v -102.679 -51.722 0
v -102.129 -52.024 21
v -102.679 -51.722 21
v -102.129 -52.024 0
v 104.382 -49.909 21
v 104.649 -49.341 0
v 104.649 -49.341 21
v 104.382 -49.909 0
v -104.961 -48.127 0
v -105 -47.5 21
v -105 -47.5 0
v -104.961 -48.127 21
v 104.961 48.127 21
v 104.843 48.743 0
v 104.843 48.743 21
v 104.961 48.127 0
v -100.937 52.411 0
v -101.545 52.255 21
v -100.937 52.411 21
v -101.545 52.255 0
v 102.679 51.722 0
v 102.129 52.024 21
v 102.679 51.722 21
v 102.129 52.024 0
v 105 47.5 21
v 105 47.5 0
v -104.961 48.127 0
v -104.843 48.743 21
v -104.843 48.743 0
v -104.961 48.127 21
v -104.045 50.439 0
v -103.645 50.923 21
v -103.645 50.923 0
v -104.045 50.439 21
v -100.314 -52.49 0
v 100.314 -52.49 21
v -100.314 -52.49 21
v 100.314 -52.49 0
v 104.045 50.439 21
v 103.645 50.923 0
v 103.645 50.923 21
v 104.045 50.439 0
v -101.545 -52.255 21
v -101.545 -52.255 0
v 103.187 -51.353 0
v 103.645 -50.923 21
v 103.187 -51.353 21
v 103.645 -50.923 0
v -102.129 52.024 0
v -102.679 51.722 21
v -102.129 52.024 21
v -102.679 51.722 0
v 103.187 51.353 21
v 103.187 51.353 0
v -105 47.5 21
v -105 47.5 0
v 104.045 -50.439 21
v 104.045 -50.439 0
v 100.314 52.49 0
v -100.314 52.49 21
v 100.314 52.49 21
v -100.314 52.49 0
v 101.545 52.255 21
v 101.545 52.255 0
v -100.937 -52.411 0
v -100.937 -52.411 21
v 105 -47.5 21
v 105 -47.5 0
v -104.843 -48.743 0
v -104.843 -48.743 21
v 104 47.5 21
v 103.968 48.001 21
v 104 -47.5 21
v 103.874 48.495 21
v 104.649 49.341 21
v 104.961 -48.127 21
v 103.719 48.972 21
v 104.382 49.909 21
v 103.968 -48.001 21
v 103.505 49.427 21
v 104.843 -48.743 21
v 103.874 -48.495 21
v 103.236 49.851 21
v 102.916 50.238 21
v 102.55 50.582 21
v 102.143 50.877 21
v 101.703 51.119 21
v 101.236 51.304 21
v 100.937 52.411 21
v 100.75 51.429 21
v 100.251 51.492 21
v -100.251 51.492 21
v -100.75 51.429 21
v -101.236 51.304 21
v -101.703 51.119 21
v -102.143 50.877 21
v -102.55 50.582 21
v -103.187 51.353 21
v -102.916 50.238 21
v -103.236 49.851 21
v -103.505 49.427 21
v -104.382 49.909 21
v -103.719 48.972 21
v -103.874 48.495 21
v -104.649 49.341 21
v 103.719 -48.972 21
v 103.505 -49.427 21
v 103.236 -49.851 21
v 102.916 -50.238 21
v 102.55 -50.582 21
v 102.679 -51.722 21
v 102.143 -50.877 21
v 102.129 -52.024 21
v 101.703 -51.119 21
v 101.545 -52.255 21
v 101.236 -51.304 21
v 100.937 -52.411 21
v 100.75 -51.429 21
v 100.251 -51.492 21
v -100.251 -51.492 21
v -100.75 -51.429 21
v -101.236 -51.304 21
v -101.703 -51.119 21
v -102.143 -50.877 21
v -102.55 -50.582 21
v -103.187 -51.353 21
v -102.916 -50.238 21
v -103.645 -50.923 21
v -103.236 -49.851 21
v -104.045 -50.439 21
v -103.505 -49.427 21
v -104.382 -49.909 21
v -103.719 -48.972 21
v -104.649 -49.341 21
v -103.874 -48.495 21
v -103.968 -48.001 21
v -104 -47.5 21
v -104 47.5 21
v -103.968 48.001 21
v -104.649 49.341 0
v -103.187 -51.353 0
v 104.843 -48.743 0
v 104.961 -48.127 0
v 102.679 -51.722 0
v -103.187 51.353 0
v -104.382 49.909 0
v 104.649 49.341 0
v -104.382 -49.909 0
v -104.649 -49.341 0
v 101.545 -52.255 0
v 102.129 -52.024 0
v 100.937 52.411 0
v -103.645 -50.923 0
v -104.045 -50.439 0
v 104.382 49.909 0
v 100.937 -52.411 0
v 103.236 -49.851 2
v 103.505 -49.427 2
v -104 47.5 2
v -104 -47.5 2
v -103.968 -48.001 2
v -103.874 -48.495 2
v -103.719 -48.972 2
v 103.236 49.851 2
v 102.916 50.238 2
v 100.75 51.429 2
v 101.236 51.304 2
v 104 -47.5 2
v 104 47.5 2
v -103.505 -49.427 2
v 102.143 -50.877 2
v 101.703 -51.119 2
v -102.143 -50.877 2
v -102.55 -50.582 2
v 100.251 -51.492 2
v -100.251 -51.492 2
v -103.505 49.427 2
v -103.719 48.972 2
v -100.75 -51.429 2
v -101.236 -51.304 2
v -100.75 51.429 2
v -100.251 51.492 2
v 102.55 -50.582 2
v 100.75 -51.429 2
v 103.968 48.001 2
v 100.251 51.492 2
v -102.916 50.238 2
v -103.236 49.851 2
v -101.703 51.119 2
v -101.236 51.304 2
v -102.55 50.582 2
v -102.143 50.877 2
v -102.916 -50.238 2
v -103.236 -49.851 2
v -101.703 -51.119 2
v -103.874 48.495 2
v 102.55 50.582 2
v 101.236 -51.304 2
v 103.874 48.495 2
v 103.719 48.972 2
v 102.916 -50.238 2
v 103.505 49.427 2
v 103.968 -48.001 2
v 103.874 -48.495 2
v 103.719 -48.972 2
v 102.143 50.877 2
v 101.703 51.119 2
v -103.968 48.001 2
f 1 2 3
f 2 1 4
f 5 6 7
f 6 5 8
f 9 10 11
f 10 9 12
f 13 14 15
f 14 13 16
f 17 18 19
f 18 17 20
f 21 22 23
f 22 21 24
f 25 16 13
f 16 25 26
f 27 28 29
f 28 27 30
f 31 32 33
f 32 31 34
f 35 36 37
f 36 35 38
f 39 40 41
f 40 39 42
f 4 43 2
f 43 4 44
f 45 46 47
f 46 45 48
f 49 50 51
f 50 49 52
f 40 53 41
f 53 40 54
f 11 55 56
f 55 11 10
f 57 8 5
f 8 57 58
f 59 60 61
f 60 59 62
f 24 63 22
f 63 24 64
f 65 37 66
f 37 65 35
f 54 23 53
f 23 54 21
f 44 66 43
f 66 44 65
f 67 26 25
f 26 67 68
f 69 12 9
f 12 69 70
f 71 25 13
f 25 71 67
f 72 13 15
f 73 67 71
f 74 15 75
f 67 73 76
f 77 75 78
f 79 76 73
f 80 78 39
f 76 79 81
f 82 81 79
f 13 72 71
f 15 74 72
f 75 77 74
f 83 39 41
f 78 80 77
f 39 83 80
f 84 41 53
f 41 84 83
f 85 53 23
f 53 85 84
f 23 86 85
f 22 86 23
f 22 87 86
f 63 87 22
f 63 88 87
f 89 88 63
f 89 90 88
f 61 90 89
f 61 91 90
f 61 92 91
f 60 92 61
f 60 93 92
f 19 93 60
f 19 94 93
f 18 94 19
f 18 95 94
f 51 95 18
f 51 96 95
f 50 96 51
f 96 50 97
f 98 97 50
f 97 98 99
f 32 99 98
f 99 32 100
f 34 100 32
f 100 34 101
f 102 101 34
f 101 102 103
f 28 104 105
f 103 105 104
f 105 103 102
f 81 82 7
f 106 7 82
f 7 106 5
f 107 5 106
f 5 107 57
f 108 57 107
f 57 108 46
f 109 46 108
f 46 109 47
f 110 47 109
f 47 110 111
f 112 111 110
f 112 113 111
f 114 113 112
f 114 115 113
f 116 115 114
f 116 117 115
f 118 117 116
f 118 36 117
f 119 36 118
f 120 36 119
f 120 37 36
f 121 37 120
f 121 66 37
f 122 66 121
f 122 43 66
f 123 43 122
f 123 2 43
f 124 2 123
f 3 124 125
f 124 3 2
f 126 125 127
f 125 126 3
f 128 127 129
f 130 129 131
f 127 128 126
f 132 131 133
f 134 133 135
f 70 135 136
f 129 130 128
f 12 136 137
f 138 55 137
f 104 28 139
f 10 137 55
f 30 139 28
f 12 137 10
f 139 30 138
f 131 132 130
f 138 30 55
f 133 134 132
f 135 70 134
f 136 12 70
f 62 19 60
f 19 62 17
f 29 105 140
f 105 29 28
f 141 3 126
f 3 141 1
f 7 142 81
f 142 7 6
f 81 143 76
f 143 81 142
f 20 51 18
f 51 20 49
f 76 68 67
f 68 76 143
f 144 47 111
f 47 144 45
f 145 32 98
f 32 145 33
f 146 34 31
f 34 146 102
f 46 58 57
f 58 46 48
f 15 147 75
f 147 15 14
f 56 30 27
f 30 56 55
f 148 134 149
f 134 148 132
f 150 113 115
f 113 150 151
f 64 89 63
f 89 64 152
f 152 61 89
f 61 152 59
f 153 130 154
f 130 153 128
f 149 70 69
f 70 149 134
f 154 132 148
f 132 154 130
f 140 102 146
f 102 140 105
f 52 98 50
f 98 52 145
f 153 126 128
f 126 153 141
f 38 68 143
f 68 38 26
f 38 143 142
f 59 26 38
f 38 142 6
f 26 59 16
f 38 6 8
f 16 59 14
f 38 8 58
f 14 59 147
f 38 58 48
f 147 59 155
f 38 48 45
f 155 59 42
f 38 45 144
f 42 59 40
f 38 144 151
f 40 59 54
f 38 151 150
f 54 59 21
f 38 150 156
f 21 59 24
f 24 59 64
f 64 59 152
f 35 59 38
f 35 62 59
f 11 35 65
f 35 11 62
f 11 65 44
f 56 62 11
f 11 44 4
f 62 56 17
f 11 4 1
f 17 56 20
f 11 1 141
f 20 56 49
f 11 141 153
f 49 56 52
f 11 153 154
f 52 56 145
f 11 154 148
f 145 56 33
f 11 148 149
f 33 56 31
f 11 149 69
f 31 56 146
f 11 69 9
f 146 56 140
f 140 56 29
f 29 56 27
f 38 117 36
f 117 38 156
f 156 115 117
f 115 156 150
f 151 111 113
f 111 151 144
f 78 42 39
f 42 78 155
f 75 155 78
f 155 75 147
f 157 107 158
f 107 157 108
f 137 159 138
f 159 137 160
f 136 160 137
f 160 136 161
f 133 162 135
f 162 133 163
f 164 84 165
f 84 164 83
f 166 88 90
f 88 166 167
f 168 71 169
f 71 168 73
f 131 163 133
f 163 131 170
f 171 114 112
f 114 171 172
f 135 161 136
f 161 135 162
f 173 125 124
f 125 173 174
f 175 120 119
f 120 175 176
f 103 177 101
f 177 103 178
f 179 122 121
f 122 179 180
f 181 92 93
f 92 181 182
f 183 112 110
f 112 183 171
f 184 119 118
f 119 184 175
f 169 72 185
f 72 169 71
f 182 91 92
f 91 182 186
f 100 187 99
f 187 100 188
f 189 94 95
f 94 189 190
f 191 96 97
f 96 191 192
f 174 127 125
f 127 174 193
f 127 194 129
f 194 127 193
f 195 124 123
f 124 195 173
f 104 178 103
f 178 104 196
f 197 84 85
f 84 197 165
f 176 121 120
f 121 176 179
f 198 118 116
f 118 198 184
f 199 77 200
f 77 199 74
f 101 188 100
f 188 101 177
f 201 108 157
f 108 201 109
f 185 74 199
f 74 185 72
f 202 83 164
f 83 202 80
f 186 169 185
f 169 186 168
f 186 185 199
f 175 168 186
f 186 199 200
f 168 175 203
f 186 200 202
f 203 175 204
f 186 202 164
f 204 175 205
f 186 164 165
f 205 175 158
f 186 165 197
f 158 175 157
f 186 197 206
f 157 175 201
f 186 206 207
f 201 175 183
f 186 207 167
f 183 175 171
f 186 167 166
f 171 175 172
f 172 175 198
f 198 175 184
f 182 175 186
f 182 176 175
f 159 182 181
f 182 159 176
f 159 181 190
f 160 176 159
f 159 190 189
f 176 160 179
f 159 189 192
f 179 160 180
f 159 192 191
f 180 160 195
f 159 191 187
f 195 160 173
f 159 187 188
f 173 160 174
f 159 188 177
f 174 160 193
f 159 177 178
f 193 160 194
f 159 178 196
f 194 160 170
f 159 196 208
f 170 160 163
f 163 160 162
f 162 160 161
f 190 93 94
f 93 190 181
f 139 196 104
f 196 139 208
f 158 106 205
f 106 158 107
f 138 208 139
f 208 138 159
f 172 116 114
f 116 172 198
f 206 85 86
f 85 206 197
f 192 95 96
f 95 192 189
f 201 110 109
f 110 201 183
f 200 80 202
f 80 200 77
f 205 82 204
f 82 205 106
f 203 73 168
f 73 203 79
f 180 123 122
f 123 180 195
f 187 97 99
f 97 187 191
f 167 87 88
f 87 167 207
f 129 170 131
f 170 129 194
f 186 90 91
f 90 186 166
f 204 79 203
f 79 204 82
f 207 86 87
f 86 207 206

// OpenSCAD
$fn = 50;


difference() {
	union() {
		hull() {
			translate(v = [-100.0000000000, 47.5000000000, 0]) {
				cylinder(h = 21, r = 5);
			}
			translate(v = [100.0000000000, 47.5000000000, 0]) {
				cylinder(h = 21, r = 5);
			}
			translate(v = [-100.0000000000, -47.5000000000, 0]) {
				cylinder(h = 21, r = 5);
			}
			translate(v = [100.0000000000, -47.5000000000, 0]) {
				cylinder(h = 21, r = 5);
			}
		}
	}
	union() {
		translate(v = [0, 0, 2]) {
			hull() {
				translate(v = [-100.0000000000, 47.5000000000, 0]) {
					cylinder(h = 19, r = 4);
				}
				translate(v = [100.0000000000, 47.5000000000, 0]) {
					cylinder(h = 19, r = 4);
				}
				translate(v = [-100.0000000000, -47.5000000000, 0]) {
					cylinder(h = 19, r = 4);
				}
				translate(v = [100.0000000000, -47.5000000000, 0]) {
					cylinder(h = 19, r = 4);
				}
			}
		}
	}
}
